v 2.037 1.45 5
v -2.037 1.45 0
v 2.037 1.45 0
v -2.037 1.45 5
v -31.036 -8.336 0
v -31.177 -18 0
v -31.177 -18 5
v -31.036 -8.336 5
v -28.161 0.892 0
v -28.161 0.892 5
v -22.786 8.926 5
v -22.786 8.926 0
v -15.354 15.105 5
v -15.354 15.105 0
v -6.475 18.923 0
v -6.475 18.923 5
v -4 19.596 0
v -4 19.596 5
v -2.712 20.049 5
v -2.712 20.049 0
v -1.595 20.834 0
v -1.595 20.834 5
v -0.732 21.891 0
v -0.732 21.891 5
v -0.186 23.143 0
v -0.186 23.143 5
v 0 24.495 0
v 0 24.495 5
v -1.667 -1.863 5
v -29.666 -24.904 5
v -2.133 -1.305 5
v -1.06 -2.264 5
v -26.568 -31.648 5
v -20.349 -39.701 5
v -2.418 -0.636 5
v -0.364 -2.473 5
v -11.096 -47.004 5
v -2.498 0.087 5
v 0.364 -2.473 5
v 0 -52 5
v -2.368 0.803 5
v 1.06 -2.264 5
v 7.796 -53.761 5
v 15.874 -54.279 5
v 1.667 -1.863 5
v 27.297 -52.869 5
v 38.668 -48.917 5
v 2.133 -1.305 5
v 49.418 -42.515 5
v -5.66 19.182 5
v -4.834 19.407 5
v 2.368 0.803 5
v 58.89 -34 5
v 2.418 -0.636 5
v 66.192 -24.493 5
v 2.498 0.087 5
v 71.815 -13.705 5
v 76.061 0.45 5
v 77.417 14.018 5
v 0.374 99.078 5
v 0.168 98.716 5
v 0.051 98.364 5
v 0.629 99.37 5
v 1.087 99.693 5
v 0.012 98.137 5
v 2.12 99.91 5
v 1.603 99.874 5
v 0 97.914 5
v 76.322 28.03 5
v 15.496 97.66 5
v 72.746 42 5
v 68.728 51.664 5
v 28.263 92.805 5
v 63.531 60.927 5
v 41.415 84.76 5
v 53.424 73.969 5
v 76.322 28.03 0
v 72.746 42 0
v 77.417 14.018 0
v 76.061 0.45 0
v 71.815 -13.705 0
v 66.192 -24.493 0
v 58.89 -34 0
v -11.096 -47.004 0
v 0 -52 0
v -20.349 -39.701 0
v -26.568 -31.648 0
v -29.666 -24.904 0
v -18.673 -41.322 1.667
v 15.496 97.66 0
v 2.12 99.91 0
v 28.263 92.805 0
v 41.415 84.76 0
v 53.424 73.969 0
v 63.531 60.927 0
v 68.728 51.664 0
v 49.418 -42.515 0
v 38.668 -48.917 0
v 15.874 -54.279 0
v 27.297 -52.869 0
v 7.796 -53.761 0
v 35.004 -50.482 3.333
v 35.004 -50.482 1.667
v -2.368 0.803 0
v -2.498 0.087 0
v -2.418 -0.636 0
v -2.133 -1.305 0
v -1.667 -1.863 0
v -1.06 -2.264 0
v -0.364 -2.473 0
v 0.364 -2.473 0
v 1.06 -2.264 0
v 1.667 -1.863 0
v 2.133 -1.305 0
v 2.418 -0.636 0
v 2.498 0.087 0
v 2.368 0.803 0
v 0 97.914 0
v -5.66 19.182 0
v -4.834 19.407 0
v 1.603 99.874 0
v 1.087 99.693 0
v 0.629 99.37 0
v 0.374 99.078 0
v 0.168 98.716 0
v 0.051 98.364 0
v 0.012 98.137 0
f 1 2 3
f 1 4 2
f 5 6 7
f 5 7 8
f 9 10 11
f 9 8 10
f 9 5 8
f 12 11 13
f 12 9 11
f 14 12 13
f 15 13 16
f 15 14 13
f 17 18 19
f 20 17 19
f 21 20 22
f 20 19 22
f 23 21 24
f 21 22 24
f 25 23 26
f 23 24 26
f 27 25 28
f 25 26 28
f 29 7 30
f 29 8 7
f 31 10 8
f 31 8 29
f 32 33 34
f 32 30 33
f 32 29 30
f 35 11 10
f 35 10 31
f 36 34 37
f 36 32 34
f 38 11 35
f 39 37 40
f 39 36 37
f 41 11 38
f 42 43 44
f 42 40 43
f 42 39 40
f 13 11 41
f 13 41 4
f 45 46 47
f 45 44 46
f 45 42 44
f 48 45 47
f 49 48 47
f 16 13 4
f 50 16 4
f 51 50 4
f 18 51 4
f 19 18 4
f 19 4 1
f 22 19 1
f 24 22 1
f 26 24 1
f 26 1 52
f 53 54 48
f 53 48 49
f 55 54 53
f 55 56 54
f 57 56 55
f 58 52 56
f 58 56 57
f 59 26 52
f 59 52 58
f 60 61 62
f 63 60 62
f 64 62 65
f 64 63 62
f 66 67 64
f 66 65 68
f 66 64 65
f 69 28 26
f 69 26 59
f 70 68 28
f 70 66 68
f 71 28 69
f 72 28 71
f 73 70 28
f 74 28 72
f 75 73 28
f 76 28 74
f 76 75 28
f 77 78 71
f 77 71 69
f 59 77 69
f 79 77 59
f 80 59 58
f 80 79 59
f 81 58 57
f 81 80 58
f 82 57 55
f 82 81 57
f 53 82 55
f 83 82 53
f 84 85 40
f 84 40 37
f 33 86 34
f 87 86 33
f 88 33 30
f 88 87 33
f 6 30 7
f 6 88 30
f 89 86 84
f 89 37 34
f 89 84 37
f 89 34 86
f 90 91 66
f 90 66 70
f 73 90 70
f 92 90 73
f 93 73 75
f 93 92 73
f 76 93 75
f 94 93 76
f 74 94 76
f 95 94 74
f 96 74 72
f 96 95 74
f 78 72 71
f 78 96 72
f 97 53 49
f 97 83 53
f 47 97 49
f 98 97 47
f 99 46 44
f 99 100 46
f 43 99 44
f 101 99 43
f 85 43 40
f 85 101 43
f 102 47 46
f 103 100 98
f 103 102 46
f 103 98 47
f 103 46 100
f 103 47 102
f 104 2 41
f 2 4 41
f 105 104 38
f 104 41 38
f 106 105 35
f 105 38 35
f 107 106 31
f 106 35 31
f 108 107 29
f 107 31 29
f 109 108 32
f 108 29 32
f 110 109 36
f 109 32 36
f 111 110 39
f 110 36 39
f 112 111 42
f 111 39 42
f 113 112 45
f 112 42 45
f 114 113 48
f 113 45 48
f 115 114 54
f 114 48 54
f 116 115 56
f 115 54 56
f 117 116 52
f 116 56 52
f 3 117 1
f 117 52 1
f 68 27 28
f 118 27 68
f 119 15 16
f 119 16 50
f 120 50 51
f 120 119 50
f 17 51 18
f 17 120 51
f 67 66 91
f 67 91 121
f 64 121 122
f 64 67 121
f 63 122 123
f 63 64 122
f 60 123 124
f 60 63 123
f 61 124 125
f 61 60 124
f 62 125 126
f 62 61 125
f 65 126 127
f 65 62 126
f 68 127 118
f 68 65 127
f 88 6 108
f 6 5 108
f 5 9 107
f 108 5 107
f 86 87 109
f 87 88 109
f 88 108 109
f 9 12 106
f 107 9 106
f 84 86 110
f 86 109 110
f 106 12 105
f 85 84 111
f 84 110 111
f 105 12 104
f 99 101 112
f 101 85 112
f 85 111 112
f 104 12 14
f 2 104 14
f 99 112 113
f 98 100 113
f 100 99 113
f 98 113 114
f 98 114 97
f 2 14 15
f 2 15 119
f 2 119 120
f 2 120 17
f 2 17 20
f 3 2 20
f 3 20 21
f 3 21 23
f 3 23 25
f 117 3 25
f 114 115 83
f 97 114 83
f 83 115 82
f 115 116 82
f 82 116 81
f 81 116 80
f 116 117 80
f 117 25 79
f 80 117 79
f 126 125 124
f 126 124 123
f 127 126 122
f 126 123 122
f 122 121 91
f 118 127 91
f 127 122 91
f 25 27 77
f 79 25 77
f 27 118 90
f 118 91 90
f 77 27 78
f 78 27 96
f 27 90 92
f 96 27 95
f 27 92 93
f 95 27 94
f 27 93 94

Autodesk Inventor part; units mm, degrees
ref_plane "YZ Plane" through (0, 0, 0) normal (1, 0, 0) x (0, 1, 0)
ref_plane "XZ Plane" through (0, 0, 0) normal (0, 1, 0) x (-1, 0, 0)
ref_plane "XY Plane" through (0, 0, 0) normal (0, 0, 1) x (1, 0, 0)
sketch "Sketch1" plane through (0, 0, 0) normal (0, 0, 1) x (1, 0, 0)
  circle A0 centre (0, 0) radius 100
  circle A1 centre (0, 0) radius 20
  arc A2 (72.7461, -42) -> (0, 84) centre (0, 0) ccw
  arc A3 (0, -68) -> (0, 68) centre (0, 0) ccw
  arc A4 (-31.1769, 18) -> (31.1769, 18) centre (0, 0) ccw
  arc A5 (-45.0333, -26) -> (45.0333, 26) centre (0, 0) ccw
  line L0 (0, 0) -> (0, 100)
  line L1 (0, 0) -> (-86.6025, 50)
  line L2 (0, 0) -> (-86.6025, -50)
  line L3 (0, 0) -> (0, -100)
  line L4 (0, 0) -> (86.6025, -50)
  line L5 (0, 0) -> (86.6025, 50)
  spline S0 degree 3 poles (0, 84) (73.4224, 56.463) (45.742, -47.7639) (0, -20) knots 0 0 0 0 1 1 1 1
  circle A6 centre (0, 0) radius 10
  spline S1 degree 4 poles (0, 100) (55.6412, 98.6208) (125.3971, 4.9821) (11.8678, -111.8252) (-57.9765, -4.8676) (-8.1188, 21.3354) (0, 10) knots 0 0 0 0 0 0.510428 0.679825 1 1 1 1 1
  arc A7 (0, 20) -> (-31.1769, -18) centre (2.2712, -13.6528) ccw
  point P0 (31.1769, -18)
  point P1 (17.3205, 10)
  point P2 (8.6603, 5)
  point P3 (17.3205, 10)
  point P4 (72.7461, 42)
  point P5 (58.8897, -34)
  point P6 (0, -52)
  point P7 (-17.3205, 10)
  point P8 (0, 20)
  point P9 (-6.4749, 18.9229)
  dimension "d0" = 200
  dimension "d24" = 20
  dimension "d1" = 40
  dimension "d2" = 168
  dimension "d3" = 136
  dimension "d4" = 104
  dimension "d5" = 72
  dimension "d9" = 360
extrude "Extrusion1" add sketch "Sketch1" along normal blind 5 contours S1 A2 L0 | L5 A3 S0 A2 | S1 A3 L5 | S0 A3 L0 | L5 S0 A3 | A3 L4 A5 L5 | S1 A5 L4 | A3 S0 L5 A1 L0 | S0 A4 L5 | A5 L4 S0 | A5 L3 A4 L4 | S1 A4 L3 | L2 A1 L3 A4 | S1 A1 L2 | A7 L1 S1 | A7 A1 L1 | A7 A1 | A1 L5 A6 L0 | L0 S1 A1 A7 | A4 L4 A1 L5 | S0 A1 L4 | A4 L3 S0 | L2 A6 L3 A1 | A1 L1 A6 L2 | S1 A6 L1 | A1 L4 A6 L5 | A6 L5 L0 | L0 L1 A6 | A1 L3 A6 L4 | A6 L1 L2 | L2 L3 A6 | A6 L4 L5 | L4 A6 L3
fillet "Fillet1" radius 2 1 edges at (0, 100, 2.5)
sketch "Sketch3" plane through (0, 0, 5) normal (0, 0, 1) x (1, 0, 0)
  circle A0 centre (0, 0) radius 2.5
  line L0 (-2.0365, 1.45) -> (2.0365, 1.45)
  dimension "d19" = 5
  dimension "d20" = 1.45
extrude "Extrusion3" cut sketch "Sketch3" against normal blind 5 contours A0 L0 picked at (-0.0619, 0.1356)
fillet "Fillet6" radius 5 1 edges at (0, 20, 2.5)
equation "\"d2\" = 0.8 * d0 + 0.2 * d1"
equation "\"d3\" = 0.6 * d0 + 0.4 * d1"
equation "\"d4\" = 0.4 * d0 + 0.6 * d1"
equation "\"d5\" = 0.2 * d0 + 0.8 * d1"
properties part number "Cam_arche1"
